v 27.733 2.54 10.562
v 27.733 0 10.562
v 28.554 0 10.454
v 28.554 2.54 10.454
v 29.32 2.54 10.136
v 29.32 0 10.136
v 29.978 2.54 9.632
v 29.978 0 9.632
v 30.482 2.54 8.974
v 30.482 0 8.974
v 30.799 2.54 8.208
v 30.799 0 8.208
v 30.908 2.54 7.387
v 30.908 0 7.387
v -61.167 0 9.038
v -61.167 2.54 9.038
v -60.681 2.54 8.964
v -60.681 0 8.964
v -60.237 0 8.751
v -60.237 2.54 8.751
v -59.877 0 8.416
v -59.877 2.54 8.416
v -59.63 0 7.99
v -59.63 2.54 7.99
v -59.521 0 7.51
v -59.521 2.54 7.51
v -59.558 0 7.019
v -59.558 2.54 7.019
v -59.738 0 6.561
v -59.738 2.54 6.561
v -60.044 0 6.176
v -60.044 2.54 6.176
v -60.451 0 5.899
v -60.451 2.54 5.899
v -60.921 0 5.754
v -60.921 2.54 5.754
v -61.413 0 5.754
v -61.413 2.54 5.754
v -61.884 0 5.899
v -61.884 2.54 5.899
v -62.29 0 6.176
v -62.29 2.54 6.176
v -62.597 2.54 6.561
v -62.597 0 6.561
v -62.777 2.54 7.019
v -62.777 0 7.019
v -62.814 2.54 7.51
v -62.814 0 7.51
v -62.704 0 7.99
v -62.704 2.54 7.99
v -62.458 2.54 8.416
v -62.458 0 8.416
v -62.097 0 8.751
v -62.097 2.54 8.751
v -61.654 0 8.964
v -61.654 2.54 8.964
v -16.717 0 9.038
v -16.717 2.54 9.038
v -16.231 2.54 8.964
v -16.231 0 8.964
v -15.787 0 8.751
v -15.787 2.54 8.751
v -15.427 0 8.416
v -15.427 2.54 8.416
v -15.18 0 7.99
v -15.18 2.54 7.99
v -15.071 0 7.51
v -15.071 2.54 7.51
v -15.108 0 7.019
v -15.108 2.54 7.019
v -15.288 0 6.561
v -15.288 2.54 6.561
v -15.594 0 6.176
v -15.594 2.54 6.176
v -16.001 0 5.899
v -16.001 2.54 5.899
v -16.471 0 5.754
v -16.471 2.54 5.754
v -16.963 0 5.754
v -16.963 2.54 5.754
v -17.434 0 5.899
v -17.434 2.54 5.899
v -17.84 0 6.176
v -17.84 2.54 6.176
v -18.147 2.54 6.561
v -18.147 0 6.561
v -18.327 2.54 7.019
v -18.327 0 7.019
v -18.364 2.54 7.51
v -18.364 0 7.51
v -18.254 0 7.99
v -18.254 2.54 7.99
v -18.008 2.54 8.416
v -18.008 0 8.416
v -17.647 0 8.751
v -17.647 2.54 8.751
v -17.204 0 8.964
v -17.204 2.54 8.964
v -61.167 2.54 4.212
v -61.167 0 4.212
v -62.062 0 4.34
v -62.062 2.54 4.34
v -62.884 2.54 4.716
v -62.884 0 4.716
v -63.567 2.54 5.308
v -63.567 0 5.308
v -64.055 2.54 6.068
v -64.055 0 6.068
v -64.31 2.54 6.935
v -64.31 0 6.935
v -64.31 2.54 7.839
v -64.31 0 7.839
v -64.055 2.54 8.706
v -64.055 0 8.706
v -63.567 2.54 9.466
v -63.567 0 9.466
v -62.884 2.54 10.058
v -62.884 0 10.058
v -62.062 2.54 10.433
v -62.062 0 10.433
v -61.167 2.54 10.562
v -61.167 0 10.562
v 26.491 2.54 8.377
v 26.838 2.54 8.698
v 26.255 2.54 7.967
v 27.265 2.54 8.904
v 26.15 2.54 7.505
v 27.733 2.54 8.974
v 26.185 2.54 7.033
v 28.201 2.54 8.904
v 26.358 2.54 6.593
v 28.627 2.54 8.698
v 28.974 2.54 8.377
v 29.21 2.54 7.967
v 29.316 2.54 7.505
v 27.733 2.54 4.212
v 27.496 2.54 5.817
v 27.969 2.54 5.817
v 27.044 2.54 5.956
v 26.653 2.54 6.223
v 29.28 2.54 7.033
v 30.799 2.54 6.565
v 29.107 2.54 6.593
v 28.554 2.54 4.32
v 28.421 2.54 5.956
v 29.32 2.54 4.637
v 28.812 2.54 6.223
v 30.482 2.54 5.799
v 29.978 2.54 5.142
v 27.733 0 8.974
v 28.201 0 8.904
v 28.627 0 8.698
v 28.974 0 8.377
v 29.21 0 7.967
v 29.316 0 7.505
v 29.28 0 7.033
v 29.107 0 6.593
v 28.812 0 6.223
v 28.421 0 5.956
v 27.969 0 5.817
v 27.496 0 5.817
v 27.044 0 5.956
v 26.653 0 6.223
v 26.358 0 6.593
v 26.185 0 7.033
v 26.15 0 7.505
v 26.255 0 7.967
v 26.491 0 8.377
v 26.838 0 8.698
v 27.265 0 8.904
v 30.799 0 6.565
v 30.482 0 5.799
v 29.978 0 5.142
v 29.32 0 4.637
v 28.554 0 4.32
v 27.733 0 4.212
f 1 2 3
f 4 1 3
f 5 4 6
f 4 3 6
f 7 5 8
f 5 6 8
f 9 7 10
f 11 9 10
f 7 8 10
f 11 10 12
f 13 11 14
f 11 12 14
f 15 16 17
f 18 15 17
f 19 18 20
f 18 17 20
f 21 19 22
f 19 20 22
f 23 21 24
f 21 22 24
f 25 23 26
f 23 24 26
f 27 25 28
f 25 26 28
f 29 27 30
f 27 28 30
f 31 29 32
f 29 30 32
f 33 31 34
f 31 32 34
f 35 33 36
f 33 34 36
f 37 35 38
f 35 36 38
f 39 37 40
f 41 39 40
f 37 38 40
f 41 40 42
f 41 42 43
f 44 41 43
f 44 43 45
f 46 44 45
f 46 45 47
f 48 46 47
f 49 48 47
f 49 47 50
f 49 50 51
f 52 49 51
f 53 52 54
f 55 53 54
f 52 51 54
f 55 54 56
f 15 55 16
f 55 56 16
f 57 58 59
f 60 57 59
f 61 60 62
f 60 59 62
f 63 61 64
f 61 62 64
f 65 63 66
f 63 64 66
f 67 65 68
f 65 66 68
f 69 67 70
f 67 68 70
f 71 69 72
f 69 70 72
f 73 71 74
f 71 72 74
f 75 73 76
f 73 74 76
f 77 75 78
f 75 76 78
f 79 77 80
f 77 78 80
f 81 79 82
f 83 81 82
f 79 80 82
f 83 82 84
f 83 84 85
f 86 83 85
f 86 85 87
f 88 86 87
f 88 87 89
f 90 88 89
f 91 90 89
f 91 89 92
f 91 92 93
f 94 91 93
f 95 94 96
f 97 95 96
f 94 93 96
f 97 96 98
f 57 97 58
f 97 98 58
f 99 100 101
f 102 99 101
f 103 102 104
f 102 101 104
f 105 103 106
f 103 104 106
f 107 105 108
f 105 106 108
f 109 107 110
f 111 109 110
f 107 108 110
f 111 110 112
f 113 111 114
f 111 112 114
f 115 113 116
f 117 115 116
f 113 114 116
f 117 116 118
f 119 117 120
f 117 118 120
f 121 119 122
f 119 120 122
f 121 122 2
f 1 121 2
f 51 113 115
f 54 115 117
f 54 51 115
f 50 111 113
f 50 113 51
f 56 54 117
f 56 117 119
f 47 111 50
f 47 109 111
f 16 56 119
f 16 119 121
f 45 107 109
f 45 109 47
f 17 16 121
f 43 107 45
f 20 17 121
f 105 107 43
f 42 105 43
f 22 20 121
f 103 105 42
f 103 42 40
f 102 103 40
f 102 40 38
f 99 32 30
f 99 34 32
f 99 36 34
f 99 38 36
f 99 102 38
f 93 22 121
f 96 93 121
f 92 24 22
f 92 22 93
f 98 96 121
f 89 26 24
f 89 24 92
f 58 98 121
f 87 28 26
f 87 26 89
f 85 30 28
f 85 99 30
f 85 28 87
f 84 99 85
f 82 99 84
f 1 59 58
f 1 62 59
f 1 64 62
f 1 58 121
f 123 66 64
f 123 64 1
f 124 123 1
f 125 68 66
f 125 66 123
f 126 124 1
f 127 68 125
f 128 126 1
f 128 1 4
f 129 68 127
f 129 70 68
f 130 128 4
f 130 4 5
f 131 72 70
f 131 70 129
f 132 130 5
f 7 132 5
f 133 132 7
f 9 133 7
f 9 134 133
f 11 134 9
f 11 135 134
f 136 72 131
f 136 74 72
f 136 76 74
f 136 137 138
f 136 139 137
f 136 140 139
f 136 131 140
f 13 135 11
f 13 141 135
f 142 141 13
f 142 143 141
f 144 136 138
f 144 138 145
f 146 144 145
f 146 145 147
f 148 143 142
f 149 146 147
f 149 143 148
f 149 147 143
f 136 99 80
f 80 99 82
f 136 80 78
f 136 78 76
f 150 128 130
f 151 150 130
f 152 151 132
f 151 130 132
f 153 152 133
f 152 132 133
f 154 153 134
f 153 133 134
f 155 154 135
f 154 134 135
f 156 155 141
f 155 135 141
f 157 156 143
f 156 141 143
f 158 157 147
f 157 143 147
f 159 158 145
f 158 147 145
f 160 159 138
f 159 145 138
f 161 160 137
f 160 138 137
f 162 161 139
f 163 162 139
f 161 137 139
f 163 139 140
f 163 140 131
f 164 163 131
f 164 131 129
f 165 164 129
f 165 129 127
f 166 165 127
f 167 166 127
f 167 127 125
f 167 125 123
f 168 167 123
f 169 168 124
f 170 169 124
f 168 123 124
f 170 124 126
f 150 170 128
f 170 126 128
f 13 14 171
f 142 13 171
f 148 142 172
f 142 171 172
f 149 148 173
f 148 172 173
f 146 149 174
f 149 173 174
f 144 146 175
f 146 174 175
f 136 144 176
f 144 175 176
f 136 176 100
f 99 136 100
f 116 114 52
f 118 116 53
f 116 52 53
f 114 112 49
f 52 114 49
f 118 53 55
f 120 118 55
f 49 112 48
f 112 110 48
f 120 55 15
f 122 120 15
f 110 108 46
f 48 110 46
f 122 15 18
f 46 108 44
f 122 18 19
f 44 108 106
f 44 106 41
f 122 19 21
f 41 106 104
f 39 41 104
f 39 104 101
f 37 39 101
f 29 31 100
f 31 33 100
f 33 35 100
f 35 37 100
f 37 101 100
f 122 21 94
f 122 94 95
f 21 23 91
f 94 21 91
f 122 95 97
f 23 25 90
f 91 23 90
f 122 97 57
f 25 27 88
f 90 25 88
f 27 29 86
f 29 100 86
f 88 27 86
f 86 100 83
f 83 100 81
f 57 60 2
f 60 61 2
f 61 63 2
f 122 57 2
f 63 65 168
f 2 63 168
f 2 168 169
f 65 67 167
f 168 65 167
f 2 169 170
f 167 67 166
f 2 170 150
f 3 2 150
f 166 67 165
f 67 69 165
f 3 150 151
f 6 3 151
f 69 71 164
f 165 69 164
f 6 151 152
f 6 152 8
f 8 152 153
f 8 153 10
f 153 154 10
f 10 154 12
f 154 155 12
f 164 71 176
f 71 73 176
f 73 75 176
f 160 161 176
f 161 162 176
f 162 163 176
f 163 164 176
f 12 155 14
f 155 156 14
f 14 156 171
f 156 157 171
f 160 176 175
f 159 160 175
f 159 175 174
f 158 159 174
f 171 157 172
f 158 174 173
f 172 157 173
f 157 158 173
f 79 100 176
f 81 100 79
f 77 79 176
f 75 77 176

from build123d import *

# Parameters (mm, degrees)
BOSS_EXTRUDE1_DEPTH = 2.54
SKETCH2_R           = 1.651
SKETCH2_R_2         = 1.5875
CUT_EXTRUDE1_DEPTH  = 2.54
SKETCH3_R           = 1.651
CUT_EXTRUDE2_DEPTH  = 2.54


with BuildPart() as part:
    # Sketch1 → Boss-Extrude1 (new body)
    with BuildSketch(Plane(origin=(0, 0, 0), x_dir=(1, 0, 0), z_dir=(0, 1, 0))):
        with BuildLine():
            ThreePointArc((-57.992346939, -7.386734694), (-58.922282909, -5.141670664), (-61.167346939, -4.211734694))
            Line((-61.167346939, -4.211734694), (-61.167346939, -10.561734694))
            ThreePointArc((-61.167346939, -10.561734694), (-58.922282909, -9.631798724), (-57.992346939, -7.386734694))
        make_face()
        with BuildLine():
            Line((-61.167346939, -10.561734694), (-61.167346939, -4.211734694))
            ThreePointArc((-61.167346939, -4.211734694), (-64.342346939, -7.386734694), (-61.167346939, -10.561734694))
        make_face()
        with BuildLine():
            Line((27.732653061, -4.211734694), (-61.167346939, -4.211734694))
            ThreePointArc((-61.167346939, -4.211734694), (-58.922282909, -5.141670664), (-57.992346939, -7.386734694))
            ThreePointArc((-57.992346939, -7.386734694), (-58.922282909, -9.631798724), (-61.167346939, -10.561734694))
            Line((-61.167346939, -10.561734694), (27.732653061, -10.561734694))
            ThreePointArc((27.732653061, -10.561734694), (24.557653061, -7.386734694), (27.732653061, -4.211734694))
        make_face()
        with BuildLine():
            ThreePointArc((30.907653061, -7.386734694), (29.977717091, -5.141670664), (27.732653061, -4.211734694))
            Line((27.732653061, -4.211734694), (27.732653061, -10.561734694))
            ThreePointArc((27.732653061, -10.561734694), (29.977717091, -9.631798724), (30.907653061, -7.386734694))
        make_face()
        with BuildLine():
            Line((27.732653061, -10.561734694), (27.732653061, -4.211734694))
            ThreePointArc((27.732653061, -4.211734694), (24.557653061, -7.386734694), (27.732653061, -10.561734694))
        make_face()
    extrude(amount=BOSS_EXTRUDE1_DEPTH)

    # Sketch2 → Cut-Extrude1 (cut)
    with BuildSketch(Plane(origin=(0, 2.54, 0), x_dir=(1, 0, 0), z_dir=(0, 1, 0))):
        with Locations(Location((-61.167346939, -7.386734694, 0), (0, 0, 270))):
            Circle(SKETCH2_R)
        with Locations(Location((27.732653061, -7.386734694, 0), (0, 0, 270))):
            Circle(SKETCH2_R_2)
    extrude(amount=-CUT_EXTRUDE1_DEPTH, mode=Mode.SUBTRACT)

    # Sketch3 → Cut-Extrude2 (cut)
    with BuildSketch(Plane(origin=(0, 2.54, 0), x_dir=(1, 0, 0), z_dir=(0, 1, 0))):
        with Locations(Location((-16.717346939, -7.386734694, 0), (0, 0, 270))):
            Circle(SKETCH3_R)
    extrude(amount=-CUT_EXTRUDE2_DEPTH, mode=Mode.SUBTRACT)


solid = part.part
